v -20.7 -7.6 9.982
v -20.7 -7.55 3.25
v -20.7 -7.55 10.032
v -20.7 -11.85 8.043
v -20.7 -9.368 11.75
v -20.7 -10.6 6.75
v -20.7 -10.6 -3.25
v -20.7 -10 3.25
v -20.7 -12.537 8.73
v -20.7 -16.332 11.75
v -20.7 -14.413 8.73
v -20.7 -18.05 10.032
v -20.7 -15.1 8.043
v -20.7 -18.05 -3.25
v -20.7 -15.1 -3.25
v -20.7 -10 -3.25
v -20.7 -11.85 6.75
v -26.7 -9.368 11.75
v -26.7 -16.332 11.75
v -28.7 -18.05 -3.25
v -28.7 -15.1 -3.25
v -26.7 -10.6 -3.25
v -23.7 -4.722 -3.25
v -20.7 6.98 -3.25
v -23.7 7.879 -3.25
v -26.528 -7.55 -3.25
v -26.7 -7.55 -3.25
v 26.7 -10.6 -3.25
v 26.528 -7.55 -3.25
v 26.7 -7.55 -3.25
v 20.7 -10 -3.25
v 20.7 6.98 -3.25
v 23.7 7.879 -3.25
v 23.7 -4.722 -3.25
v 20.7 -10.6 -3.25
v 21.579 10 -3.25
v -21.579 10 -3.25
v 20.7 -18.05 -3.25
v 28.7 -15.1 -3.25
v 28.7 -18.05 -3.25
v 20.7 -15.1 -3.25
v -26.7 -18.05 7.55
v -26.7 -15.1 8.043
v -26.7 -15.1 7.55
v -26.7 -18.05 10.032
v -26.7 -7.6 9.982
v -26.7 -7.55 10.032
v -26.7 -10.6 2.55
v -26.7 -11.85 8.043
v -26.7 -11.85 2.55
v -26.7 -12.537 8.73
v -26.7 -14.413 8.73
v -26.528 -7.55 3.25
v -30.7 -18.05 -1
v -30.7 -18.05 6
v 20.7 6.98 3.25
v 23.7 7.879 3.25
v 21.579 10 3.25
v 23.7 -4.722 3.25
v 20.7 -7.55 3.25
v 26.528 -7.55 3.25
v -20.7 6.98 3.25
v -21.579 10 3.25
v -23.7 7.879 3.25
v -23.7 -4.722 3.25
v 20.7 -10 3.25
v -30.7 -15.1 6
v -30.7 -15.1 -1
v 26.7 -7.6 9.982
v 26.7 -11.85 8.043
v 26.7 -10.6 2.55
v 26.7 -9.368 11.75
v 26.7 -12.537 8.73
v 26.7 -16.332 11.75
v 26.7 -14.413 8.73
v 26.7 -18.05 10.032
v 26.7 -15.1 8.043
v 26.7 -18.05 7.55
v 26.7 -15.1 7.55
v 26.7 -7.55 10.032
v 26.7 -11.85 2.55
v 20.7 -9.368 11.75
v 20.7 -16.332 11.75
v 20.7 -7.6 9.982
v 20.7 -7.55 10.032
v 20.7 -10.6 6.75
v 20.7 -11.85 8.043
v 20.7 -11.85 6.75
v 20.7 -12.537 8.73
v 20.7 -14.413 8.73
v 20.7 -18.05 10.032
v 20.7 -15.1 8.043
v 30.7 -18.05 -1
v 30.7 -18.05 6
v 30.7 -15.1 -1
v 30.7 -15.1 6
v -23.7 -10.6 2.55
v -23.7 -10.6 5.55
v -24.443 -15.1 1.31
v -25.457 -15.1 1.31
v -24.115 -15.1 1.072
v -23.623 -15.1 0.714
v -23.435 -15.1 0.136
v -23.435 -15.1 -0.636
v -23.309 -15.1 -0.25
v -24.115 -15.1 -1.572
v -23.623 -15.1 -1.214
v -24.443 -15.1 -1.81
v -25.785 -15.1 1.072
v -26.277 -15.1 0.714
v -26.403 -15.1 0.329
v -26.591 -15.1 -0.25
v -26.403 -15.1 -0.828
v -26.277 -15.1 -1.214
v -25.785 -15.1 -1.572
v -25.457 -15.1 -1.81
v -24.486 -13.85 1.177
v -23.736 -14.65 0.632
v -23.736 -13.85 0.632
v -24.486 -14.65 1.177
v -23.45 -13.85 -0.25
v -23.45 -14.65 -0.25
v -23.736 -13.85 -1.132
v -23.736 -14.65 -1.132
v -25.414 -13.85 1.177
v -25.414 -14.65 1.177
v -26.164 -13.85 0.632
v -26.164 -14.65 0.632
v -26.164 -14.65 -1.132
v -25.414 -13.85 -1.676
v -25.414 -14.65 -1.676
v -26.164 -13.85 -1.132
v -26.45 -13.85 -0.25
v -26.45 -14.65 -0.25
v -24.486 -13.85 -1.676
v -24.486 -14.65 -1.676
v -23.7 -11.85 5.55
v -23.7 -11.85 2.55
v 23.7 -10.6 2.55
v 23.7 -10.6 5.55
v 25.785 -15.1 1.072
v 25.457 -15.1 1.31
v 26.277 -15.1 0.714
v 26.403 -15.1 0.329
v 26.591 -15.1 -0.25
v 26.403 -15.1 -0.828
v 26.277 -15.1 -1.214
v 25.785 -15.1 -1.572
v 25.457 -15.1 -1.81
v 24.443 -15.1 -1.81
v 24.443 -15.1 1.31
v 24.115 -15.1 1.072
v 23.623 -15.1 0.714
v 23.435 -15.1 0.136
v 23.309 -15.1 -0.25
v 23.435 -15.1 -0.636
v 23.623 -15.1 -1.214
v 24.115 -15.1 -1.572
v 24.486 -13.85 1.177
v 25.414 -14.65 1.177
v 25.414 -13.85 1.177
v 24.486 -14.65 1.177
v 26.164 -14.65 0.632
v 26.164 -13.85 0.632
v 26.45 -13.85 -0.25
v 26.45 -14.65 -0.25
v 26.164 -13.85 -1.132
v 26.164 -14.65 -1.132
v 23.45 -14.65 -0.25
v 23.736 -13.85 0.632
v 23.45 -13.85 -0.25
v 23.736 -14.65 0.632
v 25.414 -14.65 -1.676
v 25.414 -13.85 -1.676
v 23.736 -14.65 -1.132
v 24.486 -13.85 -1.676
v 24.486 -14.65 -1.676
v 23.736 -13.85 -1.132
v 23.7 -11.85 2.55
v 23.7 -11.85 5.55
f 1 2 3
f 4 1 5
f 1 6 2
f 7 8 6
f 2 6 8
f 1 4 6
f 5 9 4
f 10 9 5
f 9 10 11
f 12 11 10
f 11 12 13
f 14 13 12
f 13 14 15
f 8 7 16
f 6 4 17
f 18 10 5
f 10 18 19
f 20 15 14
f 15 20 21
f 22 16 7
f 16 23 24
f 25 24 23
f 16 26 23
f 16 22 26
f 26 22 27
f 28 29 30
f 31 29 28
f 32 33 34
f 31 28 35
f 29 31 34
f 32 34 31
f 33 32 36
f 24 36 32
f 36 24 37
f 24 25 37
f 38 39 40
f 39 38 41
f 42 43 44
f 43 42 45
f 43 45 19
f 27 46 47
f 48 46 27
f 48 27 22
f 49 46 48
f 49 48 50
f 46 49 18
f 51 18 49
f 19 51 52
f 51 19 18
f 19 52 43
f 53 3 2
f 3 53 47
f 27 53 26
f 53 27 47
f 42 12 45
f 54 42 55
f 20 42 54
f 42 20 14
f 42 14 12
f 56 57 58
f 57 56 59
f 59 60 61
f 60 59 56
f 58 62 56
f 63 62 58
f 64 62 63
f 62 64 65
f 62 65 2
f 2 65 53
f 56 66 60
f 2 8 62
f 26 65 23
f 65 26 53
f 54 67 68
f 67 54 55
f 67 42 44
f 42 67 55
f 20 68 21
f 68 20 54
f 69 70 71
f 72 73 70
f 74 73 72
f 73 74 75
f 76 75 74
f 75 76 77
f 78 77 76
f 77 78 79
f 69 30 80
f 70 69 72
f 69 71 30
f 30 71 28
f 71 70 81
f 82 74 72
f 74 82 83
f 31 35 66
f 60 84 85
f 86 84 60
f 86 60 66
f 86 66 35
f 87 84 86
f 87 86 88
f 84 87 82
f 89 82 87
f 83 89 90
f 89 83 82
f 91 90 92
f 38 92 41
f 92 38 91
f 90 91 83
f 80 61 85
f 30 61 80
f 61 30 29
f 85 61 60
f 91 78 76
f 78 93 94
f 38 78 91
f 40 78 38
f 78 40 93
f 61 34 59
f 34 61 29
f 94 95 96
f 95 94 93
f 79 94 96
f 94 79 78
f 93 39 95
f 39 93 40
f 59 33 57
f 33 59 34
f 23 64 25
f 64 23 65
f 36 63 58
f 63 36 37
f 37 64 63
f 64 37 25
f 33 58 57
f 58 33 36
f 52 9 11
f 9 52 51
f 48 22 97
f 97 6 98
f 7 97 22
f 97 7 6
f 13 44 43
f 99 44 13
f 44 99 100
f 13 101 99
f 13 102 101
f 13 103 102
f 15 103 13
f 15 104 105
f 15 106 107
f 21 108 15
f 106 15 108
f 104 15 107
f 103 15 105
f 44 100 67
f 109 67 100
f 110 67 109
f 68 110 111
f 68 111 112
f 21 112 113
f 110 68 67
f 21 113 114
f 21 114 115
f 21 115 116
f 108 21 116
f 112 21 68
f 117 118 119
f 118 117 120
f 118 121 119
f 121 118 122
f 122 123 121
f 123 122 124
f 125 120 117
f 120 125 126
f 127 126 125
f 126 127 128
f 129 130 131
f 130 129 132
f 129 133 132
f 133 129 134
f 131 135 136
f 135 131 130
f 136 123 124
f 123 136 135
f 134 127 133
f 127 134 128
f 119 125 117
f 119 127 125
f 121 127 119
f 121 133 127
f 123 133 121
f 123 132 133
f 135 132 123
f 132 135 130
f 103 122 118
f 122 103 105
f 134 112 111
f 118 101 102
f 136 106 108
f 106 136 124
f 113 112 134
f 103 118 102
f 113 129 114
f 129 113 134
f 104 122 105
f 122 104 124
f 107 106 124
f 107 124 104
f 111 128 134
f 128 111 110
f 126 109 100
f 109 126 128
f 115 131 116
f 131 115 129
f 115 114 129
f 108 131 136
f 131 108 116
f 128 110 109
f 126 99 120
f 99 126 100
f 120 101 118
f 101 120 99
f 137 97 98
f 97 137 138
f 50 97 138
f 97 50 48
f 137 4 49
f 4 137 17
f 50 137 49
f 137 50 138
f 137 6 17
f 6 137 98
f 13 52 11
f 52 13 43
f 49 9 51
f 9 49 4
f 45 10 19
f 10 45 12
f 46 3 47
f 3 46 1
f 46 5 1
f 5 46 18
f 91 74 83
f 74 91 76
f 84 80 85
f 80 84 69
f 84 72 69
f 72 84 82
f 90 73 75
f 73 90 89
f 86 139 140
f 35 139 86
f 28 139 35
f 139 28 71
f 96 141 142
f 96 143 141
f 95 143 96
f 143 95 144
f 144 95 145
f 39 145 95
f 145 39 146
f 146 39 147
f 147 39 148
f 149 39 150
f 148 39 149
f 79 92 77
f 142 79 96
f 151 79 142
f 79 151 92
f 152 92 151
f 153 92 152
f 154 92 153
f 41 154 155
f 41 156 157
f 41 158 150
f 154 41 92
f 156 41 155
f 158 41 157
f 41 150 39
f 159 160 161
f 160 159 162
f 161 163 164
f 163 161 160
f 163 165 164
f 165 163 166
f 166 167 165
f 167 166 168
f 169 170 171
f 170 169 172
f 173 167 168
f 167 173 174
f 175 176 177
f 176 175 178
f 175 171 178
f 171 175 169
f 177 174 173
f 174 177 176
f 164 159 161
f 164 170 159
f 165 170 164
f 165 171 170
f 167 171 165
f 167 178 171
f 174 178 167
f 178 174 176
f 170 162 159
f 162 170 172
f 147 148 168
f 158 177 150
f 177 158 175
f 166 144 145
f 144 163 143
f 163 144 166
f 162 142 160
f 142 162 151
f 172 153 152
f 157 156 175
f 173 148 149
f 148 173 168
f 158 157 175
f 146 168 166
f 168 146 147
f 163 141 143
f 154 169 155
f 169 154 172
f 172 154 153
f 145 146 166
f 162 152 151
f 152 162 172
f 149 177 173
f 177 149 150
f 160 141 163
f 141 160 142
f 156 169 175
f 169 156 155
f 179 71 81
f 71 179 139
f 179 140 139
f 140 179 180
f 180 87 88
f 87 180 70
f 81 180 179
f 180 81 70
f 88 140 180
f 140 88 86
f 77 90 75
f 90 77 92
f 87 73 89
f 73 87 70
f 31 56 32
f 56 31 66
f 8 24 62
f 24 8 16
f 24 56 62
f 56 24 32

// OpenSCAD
// Quick fix for muze

$fn=20;
it=[-1,1];

g_length=41.4;
g_width=17;
g_height=6.5;
g_th=3;

s_length=6;
s_width=4.5;
s_height=12;
s_th=3;

quickfix();

module quickfix()
{
	difference()
	{
		quickfix_plain();
		quickfix_void();
	}
	
	//gopro
	*%translate([0, -21/2-2, 3]) cube([41+6, 3, 59+6], true);
	%translate([7, -21/2+7, 17]) rotate([0, 90, 0]) gg_gopro_camera_H3();
	*%translate([.25, 78.6, -3.25]) rotate([0, 0, -90]) import("gopro-h32d-mount.stl");
}

module quickfix_plain()
{
	// gopro
	cube([g_length+g_th*2, g_width+g_th, g_height], true);
	
	//screw fix
	for(i=it) translate([i*(g_length+g_th*2)/2, -(s_width+s_th*2)/2-(g_width+g_th)/2+2.45, 0])
	{
		translate([0, 0, (s_height+s_th)/2-g_height/2]) cube([s_length, s_width+s_th*2, s_height+s_th], true);
		translate([0, (s_width+s_th*2)/2, 0]) rotate([0, 0, 45]) cube([s_length/1.5, s_length/1.5, g_height], true);
		hull()
		{
			translate([i==1?s_length/2+2:-(s_length/2+2), -(s_width+s_th)/2, -(s_height+s_th)/2+10]) cube([4, s_th, 7], true);
			translate([i*2, -(s_width+s_th)/2, (s_height+s_th)/2-g_height/2-s_height/2-s_th/2+.05]) cube([s_length, s_th, .1], true);
			translate([0, -(s_width+s_th)/2, (s_height+s_th)/2]) cube([s_length, s_th, .1], true);
		}
	}
}

module quickfix_void()
{
	// gopro
	translate([0, -g_th/2-.02, 0]) cube([g_length, g_width, g_height+1], true);
	for(i=it) translate([i*(g_length+g_th*2)/2, (g_width+g_th)/2, 0]) rotate([0, 0, 45]) cube([3, 3, g_height+1], true);
	
	//screw fix
	for(i=it) translate([i*(g_length+g_th*2)/2, -(s_width+s_th*2)/2-(g_width+g_th)/2+2.4, (s_height+s_th)/2-g_height/2])
	{
		difference()
		{
			translate([0, 0, -g_th/2-.02]) cube([s_length+10, s_width, s_height], true);
			
			translate([i*1.25, -1, -s_height/2-s_th/22-3/2+.1365+3]) rotate([90, 0, 0]) cylinder(r=3/2, h=2, center=false, $fn=10);
			translate([i*1.25, -1.8, -s_height/2-s_th/22-3/2+.1365+3]) rotate([90, 0, 0]) cylinder(r1=3/2, r2=3.5/2, h=.8, center=false, $fn=10);
			
			translate([i*s_length/4, 2, -s_height/2+5.8]) cube([s_length/2, 2, 3], true);
			hull()
			{
				translate([i*s_length/4, 2, -s_height/2+8.8]) cube([s_length/2, 2, 3], true);
				translate([0, 2, s_height/2-2]) cube([s_length, 2, 3], true);
			}
			translate([0, -s_width/2, (s_height-s_th)/2]) rotate([45, 0, 0]) cube([s_length, 1, 1], true);
			translate([0, s_width/2-1.25, (s_height-s_th)/2]) rotate([45, 0, 0]) cube([s_length, 1, 1], true);
		}
		for(i=it) translate([0, i*(s_width+s_th*2)/2, (s_height+s_th)/2]) rotate([45, 0, 0]) cube([s_length+1, 2.5, 2.5], true);
	}
}

module gg_gopro_camera_H3() 
{
    //main body
	translate([-15.2,-10.5,-27.5]) cube([59,21,41]);
	
    //lens
	translate([0,20,0]) rotate(a=[90,0,0]) cylinder(h=25, r=11.5, $fn=64);
}
